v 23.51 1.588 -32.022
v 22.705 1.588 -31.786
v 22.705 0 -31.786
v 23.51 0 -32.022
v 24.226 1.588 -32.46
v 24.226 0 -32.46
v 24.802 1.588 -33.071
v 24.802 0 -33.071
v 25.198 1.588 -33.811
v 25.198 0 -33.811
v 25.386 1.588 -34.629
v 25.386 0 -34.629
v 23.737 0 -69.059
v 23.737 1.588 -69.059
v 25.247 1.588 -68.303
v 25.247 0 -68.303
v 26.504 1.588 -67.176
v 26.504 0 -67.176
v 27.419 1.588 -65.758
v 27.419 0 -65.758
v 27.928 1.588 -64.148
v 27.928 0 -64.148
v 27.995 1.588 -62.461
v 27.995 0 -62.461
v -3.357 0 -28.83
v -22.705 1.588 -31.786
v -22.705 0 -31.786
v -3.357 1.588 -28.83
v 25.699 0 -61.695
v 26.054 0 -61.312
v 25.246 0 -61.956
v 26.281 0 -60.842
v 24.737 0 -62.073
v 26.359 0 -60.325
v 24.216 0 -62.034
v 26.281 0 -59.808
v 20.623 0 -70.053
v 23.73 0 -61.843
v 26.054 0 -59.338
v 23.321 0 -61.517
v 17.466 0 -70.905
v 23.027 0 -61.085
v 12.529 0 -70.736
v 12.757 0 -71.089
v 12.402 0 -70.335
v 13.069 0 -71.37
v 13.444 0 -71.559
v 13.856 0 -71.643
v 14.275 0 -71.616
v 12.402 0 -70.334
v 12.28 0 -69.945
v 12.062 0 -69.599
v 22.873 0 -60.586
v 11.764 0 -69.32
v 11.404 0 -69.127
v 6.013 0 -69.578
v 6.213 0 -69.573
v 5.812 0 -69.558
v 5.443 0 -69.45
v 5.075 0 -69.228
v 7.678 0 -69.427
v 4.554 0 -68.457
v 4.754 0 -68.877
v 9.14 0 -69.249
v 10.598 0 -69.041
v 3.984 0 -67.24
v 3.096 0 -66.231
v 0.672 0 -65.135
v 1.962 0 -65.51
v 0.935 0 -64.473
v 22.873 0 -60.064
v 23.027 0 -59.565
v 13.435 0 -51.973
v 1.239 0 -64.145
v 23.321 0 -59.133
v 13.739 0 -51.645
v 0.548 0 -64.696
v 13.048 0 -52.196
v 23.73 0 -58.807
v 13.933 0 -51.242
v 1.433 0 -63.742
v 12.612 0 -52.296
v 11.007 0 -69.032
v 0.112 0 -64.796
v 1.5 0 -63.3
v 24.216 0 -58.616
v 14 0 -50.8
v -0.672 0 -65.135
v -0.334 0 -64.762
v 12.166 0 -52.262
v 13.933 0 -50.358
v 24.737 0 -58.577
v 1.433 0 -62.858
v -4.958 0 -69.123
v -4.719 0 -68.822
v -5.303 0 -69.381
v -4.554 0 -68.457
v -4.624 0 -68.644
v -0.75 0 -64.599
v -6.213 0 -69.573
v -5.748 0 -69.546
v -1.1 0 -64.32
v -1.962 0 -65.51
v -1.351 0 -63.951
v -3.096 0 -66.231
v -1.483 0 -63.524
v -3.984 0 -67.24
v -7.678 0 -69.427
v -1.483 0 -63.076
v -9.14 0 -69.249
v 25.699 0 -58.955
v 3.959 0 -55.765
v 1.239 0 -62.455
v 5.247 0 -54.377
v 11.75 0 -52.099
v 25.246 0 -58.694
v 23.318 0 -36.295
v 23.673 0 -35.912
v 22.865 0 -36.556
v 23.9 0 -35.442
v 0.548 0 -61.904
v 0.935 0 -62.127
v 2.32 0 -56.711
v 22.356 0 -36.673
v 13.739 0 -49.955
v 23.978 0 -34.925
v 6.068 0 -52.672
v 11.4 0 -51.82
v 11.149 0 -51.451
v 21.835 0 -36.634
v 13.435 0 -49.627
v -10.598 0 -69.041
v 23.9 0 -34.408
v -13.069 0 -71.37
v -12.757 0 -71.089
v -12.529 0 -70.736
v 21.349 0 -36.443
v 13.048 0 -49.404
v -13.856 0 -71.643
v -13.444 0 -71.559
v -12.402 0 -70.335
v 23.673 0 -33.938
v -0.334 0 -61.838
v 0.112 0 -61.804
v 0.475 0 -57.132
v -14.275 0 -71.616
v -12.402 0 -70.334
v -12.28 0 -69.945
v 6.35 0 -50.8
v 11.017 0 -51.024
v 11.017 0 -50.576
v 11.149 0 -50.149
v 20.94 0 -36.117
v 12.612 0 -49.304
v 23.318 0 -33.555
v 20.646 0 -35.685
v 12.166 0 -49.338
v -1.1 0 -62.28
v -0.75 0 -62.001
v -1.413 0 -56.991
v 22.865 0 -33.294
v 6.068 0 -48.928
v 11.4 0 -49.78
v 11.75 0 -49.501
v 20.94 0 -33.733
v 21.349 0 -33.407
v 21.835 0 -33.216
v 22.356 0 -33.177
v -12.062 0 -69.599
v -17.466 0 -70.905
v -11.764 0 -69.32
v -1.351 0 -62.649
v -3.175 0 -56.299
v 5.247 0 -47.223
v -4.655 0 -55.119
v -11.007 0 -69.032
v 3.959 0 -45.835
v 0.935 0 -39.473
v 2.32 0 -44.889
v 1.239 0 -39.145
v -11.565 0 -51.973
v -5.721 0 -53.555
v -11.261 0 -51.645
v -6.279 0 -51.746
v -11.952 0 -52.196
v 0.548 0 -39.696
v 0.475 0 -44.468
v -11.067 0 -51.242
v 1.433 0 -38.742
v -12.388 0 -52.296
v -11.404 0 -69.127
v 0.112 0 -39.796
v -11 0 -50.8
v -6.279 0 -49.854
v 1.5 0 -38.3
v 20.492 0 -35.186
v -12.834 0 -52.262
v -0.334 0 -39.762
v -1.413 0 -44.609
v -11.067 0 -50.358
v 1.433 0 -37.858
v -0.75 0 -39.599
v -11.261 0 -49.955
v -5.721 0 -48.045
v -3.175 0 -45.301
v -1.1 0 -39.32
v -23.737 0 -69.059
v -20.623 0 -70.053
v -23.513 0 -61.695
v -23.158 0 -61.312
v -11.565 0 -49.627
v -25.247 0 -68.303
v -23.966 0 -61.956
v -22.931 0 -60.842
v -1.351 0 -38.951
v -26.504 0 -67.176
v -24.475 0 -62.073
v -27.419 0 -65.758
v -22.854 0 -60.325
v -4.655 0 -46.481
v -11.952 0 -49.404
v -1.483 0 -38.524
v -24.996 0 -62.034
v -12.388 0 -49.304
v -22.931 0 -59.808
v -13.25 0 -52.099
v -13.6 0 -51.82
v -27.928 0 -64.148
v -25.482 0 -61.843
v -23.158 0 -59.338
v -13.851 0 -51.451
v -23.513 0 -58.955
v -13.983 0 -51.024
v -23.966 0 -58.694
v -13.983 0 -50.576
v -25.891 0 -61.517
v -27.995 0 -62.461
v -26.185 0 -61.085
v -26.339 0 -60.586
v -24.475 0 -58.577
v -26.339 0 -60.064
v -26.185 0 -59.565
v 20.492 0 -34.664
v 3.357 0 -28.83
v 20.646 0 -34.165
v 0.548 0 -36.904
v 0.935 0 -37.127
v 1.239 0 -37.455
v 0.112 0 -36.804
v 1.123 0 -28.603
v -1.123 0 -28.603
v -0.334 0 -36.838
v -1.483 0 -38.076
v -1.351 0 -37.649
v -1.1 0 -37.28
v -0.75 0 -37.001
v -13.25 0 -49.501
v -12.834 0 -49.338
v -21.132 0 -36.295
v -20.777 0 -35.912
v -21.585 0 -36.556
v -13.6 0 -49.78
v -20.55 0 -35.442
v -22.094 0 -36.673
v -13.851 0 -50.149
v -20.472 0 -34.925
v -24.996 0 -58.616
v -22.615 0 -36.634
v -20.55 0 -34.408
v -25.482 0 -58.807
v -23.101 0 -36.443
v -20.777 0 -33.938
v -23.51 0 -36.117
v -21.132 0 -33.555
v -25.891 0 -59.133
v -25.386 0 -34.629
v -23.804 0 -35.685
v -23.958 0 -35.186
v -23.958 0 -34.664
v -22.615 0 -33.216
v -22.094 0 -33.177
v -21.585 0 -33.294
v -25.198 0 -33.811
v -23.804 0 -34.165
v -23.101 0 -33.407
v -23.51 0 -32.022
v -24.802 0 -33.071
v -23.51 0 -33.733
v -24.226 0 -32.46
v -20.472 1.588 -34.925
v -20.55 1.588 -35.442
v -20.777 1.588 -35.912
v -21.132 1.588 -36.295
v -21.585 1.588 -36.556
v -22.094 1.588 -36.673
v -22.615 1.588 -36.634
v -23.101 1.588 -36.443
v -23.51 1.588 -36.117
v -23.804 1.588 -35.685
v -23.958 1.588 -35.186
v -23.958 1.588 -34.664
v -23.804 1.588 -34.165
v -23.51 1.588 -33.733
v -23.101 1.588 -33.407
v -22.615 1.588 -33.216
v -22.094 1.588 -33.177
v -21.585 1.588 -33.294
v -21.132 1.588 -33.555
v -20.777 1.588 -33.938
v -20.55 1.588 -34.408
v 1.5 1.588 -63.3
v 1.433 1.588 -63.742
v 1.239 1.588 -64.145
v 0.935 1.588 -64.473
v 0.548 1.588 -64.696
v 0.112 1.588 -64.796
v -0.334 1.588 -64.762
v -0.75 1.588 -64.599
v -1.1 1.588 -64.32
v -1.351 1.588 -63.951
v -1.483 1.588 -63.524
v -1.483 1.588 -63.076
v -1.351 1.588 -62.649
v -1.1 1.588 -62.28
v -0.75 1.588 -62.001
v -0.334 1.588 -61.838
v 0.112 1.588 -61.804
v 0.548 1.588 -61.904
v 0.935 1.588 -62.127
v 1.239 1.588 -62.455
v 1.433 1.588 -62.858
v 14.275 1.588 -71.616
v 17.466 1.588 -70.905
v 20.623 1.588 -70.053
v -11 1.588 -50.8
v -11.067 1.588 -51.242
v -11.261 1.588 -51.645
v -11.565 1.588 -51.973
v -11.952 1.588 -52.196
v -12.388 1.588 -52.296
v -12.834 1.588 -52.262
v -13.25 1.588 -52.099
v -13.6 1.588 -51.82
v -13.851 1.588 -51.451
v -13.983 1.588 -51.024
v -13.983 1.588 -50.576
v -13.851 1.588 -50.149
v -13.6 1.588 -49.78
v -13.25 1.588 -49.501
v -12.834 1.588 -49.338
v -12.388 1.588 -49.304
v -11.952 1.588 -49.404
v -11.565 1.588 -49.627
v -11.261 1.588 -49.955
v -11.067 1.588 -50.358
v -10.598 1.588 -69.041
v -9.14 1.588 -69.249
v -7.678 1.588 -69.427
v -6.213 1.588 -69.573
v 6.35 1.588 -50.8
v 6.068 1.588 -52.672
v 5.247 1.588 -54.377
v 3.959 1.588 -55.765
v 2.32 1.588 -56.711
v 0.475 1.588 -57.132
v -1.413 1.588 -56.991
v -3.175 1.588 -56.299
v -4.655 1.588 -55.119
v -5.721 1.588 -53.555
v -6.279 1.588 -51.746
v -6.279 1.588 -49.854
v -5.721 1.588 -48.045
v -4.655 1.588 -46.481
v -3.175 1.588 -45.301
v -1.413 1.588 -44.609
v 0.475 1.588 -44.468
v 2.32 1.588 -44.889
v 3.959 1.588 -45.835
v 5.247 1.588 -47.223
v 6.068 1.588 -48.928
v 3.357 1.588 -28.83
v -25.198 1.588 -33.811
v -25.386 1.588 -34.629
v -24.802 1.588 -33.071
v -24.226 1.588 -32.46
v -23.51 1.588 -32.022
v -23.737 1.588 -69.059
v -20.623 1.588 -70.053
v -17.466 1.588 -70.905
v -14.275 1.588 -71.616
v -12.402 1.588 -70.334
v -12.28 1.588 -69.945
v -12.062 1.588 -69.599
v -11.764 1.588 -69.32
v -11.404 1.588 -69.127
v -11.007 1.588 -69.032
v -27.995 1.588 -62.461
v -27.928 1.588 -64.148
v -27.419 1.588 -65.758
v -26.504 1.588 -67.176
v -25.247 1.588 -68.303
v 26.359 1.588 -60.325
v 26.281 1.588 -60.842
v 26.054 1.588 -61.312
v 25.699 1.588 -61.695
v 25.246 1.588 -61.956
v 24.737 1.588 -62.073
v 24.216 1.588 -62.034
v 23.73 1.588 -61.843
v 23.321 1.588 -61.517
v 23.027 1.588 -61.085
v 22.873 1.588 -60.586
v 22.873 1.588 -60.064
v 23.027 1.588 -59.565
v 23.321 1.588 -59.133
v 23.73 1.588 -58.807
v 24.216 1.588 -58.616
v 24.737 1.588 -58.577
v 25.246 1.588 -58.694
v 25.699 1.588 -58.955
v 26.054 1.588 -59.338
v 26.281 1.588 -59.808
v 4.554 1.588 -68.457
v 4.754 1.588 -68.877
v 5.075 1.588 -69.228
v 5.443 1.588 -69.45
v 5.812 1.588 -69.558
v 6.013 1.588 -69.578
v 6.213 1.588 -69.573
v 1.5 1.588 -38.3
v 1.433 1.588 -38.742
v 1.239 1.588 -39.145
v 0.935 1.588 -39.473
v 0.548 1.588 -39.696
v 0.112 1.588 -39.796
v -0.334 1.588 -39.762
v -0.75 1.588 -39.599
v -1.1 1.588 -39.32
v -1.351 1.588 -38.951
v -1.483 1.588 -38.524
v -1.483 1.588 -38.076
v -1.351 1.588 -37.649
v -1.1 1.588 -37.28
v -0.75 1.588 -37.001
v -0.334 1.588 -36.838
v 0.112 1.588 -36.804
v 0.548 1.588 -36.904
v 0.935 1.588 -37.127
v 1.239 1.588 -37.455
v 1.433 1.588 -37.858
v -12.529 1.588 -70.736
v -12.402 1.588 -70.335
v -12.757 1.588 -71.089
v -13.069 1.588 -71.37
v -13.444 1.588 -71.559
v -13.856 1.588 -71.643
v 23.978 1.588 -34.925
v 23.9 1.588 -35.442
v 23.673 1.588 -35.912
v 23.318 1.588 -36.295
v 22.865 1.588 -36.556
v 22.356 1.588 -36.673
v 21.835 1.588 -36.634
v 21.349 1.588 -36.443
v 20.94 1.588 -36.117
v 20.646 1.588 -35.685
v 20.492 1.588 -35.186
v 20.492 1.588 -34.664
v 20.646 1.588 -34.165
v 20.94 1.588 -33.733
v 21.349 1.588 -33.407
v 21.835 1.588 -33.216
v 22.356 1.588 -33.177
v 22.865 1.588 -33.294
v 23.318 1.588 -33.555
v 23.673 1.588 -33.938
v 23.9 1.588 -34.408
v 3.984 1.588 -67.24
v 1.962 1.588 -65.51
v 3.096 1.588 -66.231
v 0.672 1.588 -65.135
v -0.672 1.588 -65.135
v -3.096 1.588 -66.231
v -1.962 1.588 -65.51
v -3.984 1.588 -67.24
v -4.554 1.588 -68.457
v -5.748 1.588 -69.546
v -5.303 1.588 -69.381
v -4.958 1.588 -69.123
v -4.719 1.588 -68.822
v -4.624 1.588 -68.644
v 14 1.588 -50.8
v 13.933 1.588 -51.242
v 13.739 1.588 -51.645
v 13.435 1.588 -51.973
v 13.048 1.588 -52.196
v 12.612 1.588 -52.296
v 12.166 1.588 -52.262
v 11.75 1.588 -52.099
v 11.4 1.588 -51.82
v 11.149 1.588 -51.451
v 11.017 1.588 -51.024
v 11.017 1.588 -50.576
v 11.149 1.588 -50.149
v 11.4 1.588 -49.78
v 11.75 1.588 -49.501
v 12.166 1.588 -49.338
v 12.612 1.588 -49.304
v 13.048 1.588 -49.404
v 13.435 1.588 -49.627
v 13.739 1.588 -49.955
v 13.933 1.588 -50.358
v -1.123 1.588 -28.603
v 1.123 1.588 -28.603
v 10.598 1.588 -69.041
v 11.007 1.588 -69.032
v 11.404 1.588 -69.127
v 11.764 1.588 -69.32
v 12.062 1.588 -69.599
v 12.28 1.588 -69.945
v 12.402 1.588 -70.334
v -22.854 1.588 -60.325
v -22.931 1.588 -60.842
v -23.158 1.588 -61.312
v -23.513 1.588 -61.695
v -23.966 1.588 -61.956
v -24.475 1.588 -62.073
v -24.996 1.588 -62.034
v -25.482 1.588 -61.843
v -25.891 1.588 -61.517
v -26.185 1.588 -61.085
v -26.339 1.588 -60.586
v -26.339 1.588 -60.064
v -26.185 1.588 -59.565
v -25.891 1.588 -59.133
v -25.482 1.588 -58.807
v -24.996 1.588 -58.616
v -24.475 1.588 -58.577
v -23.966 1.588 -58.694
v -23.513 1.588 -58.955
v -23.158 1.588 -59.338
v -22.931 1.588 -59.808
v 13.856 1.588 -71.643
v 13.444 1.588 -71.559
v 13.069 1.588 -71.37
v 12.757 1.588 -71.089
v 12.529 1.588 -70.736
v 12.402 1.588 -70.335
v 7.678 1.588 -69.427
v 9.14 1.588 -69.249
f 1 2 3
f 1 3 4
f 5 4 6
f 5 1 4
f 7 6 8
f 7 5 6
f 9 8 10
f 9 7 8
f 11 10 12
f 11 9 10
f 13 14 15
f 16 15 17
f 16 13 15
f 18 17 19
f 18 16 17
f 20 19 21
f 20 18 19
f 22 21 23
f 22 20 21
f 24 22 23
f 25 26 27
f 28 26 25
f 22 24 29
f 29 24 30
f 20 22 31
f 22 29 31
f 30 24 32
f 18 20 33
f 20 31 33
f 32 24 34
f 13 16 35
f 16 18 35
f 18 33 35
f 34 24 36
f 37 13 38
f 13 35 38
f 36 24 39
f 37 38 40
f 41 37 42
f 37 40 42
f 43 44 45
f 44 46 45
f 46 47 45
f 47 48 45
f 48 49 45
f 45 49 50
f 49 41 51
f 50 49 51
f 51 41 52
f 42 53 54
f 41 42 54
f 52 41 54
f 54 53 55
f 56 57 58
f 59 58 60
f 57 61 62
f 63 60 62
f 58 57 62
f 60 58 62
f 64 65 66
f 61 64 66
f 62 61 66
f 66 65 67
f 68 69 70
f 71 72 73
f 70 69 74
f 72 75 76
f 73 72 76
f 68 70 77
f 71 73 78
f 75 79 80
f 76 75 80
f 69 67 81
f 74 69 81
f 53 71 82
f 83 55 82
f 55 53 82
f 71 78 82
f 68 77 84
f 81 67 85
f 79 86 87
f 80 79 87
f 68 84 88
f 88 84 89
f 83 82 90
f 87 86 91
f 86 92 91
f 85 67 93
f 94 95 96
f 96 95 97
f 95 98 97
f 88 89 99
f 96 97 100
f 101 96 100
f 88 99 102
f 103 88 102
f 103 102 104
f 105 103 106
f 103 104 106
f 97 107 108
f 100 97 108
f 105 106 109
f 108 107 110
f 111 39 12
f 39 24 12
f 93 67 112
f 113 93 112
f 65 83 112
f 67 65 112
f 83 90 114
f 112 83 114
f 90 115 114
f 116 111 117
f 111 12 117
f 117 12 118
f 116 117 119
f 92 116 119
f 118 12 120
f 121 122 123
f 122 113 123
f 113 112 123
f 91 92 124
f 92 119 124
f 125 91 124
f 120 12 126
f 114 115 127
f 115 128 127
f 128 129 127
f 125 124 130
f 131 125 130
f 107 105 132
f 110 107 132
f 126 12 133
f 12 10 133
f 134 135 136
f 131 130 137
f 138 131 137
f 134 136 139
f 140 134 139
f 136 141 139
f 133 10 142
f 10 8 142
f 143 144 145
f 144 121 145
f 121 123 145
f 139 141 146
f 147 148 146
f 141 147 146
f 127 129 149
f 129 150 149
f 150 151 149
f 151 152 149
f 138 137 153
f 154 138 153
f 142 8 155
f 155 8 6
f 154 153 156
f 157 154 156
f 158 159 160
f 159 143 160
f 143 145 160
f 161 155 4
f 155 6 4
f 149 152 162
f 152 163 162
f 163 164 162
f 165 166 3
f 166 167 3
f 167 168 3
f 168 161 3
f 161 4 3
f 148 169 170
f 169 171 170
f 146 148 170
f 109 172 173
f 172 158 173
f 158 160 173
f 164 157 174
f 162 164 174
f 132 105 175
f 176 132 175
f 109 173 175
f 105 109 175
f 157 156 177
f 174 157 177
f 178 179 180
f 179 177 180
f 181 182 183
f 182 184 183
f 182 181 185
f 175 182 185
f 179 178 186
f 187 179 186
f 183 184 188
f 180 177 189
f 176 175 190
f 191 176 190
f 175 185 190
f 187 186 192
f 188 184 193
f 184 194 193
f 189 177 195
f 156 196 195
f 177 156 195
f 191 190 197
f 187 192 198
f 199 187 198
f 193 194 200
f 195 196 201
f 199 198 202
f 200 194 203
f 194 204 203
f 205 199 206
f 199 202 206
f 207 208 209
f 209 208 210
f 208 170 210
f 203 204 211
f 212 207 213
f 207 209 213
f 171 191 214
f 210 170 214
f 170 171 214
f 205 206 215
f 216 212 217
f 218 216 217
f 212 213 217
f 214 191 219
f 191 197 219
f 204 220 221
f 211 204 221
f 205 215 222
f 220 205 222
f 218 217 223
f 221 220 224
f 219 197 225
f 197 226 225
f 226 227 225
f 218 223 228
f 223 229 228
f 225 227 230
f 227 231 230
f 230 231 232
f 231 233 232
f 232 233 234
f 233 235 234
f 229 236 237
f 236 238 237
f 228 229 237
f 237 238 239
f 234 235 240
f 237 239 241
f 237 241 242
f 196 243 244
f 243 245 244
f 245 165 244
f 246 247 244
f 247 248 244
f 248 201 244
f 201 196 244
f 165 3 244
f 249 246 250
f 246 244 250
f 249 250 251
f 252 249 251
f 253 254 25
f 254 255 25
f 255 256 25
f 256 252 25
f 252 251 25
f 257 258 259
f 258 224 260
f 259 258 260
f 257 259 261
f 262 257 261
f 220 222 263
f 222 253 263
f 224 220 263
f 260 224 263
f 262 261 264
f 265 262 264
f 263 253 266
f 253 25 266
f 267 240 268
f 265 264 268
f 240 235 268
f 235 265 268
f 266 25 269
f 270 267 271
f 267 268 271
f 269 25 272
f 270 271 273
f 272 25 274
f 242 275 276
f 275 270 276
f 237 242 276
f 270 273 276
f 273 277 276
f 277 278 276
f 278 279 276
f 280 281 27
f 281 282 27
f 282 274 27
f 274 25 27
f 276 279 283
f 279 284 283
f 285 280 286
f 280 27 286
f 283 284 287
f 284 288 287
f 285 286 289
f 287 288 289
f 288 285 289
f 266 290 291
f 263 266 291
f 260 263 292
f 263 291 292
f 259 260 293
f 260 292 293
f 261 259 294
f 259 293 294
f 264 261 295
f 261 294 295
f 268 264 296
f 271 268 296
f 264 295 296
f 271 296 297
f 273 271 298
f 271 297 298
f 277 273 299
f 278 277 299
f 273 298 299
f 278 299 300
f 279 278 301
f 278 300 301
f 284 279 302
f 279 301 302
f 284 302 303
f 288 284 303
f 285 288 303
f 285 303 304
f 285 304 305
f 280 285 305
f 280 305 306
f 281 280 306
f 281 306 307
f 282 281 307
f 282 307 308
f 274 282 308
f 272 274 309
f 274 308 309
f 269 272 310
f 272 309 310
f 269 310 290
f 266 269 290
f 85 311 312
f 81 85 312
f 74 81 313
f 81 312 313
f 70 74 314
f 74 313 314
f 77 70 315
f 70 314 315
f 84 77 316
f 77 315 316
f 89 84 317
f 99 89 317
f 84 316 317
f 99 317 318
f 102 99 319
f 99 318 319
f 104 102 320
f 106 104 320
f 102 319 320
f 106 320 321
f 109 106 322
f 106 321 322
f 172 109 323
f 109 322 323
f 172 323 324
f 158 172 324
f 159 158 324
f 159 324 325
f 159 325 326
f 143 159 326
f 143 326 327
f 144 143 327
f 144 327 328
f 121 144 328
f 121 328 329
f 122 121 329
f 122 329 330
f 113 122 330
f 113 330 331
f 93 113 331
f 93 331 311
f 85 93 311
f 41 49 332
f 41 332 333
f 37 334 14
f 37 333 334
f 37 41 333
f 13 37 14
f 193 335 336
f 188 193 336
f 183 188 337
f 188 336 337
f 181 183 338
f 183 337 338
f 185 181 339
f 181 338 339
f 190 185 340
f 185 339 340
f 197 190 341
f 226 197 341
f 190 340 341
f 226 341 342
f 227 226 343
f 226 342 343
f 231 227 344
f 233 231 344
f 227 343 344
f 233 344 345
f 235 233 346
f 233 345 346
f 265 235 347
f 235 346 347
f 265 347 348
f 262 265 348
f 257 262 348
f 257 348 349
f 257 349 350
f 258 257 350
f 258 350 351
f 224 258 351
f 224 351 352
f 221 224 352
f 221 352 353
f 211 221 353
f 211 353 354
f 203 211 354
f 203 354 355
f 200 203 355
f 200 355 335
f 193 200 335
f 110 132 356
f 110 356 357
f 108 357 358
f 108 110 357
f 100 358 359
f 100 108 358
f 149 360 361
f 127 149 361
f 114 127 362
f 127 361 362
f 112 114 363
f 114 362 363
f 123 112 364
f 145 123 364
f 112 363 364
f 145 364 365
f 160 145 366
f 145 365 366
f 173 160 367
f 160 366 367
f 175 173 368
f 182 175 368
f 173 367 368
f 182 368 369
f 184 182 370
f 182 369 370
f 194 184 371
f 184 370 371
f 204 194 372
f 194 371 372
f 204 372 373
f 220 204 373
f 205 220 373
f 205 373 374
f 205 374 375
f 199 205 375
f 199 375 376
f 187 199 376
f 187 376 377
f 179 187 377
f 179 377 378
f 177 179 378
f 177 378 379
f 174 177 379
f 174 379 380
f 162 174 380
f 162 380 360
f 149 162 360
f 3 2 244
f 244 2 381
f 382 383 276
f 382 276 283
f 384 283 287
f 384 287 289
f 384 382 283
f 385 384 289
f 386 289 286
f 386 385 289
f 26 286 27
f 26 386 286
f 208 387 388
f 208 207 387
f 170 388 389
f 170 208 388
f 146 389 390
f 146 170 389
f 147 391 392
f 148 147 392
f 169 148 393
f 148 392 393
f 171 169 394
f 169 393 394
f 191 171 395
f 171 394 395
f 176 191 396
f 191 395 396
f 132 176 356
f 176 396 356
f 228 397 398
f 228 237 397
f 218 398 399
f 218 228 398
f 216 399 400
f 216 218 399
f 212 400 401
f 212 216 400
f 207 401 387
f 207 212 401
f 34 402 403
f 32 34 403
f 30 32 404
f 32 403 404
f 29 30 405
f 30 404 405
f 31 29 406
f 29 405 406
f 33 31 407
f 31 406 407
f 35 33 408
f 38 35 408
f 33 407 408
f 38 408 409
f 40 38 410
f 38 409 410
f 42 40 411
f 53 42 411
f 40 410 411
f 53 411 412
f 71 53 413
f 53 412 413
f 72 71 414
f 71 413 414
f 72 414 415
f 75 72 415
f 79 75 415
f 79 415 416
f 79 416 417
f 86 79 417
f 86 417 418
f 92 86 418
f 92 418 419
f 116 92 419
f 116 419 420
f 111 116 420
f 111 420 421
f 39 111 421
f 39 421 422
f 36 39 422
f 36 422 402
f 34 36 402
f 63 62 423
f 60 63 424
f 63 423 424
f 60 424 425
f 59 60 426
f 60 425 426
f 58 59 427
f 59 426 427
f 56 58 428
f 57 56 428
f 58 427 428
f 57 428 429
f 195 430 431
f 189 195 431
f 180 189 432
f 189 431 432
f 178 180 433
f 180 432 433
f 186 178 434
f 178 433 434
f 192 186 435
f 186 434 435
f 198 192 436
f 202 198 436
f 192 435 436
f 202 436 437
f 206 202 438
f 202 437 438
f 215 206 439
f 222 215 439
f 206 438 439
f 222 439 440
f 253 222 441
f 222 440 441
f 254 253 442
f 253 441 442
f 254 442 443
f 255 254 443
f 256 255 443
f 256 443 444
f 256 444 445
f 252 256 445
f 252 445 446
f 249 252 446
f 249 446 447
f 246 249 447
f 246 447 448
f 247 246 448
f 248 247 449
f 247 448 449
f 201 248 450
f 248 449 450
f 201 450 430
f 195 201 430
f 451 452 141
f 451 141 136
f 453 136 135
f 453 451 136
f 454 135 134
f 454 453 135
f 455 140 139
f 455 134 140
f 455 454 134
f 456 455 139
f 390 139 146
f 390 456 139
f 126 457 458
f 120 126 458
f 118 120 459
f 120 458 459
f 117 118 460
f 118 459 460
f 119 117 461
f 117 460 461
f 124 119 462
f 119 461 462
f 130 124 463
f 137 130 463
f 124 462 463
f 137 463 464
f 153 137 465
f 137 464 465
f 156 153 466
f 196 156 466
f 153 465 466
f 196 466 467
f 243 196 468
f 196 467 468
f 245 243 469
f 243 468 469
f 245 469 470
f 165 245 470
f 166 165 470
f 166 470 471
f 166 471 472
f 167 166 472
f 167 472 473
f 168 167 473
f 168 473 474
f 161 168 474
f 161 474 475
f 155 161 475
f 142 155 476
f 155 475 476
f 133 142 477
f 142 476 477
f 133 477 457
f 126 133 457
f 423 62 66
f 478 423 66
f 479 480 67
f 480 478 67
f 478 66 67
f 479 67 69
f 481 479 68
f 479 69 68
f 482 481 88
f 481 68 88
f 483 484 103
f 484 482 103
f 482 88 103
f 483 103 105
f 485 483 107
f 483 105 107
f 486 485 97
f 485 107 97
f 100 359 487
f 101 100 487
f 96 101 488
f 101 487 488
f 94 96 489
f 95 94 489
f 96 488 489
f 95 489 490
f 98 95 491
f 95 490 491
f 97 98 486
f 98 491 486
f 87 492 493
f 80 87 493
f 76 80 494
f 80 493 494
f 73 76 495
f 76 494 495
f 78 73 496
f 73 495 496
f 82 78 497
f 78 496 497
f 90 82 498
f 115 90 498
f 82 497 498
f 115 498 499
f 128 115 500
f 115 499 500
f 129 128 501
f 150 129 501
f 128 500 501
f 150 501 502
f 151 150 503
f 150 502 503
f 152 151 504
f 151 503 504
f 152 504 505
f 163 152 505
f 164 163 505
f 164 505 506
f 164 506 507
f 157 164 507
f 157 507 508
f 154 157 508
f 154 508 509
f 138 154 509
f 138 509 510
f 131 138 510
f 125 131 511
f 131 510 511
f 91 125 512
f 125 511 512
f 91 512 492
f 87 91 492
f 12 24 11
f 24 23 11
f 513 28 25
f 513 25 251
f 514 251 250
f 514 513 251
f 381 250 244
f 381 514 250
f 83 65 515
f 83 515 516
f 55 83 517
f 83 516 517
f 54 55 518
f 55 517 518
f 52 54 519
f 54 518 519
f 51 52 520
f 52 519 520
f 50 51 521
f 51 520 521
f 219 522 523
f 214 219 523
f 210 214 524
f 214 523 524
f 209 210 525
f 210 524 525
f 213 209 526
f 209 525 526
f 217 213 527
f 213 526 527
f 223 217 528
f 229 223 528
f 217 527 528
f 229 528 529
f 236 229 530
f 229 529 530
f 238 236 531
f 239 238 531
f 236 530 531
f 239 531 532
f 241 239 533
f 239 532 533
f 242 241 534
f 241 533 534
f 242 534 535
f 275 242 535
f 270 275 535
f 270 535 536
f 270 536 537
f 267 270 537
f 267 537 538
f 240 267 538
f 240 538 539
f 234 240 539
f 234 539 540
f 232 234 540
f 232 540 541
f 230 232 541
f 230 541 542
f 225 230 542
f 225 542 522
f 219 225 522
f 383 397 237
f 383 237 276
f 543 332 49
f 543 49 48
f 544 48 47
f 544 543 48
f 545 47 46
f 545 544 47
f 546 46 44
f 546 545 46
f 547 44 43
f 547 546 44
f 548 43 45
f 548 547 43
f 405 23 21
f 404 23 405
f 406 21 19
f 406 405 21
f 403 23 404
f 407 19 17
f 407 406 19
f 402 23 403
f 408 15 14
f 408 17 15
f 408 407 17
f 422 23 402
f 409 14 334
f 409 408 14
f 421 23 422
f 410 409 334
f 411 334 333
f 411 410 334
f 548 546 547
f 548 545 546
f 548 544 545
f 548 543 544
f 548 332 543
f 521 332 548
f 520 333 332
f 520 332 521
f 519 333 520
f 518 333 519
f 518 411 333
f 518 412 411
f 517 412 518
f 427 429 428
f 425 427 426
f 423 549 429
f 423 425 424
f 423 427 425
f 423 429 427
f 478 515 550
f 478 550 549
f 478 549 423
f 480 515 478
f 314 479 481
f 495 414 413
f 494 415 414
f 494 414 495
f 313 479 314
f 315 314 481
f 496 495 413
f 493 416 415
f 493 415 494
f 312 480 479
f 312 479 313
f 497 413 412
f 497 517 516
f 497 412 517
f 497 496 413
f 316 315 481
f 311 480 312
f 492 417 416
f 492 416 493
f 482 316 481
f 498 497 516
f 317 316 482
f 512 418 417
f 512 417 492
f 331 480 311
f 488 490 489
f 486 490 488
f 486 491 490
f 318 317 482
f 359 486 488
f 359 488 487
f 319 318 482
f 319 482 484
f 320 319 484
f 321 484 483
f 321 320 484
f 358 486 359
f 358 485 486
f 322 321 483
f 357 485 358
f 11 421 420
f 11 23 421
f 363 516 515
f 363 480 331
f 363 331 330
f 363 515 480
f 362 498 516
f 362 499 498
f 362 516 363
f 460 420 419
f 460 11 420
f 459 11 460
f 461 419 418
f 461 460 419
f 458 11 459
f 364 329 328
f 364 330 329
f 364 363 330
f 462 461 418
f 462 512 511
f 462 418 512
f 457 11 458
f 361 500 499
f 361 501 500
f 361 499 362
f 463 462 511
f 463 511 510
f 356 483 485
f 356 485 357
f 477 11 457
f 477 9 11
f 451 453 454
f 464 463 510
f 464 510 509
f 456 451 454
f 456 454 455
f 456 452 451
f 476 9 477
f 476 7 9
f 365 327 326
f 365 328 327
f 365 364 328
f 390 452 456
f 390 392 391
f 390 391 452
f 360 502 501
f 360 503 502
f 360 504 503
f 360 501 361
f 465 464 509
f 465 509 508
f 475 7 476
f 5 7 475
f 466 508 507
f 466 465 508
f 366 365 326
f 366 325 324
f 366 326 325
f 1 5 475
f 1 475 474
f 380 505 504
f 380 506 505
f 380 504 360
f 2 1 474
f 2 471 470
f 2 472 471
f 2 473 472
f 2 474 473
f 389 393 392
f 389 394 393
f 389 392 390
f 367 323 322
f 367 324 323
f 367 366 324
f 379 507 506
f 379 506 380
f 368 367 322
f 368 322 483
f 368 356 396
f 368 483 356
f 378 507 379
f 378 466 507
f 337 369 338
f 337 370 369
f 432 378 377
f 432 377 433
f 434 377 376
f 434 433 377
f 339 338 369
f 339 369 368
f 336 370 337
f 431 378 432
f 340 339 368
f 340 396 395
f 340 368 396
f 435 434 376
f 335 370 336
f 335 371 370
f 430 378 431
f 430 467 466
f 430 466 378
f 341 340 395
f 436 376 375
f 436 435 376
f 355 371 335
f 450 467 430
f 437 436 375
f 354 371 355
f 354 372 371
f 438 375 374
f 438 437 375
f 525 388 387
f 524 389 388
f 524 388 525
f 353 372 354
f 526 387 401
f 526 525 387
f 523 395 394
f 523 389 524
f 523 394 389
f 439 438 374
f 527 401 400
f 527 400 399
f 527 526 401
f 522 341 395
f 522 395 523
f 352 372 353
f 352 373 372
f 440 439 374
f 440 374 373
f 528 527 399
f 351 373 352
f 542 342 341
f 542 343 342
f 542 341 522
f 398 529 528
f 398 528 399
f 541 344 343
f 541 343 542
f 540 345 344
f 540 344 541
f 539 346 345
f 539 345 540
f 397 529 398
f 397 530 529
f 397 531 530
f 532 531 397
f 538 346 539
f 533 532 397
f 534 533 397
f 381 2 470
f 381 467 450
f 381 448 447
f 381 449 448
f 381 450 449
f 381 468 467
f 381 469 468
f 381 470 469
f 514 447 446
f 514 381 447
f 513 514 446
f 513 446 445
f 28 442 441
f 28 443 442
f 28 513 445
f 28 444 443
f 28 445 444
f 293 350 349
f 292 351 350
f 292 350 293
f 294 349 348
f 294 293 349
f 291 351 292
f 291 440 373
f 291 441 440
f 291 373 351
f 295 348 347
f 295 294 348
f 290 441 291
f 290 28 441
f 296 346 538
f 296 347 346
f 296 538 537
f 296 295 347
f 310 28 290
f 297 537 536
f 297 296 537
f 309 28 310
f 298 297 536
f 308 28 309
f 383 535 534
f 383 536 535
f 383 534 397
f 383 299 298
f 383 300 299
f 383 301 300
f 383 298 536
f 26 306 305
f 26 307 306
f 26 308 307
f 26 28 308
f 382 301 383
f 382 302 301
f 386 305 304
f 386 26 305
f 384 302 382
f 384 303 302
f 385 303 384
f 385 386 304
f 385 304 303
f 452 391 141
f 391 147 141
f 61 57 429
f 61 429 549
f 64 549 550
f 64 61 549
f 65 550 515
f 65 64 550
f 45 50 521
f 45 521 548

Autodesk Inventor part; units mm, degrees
ref_plane "YZ Plane" through (0, 0, 0) normal (1, 0, 0) x (0, 1, 0)
ref_plane "XZ Plane" through (0, 0, 0) normal (0, 1, 0) x (-1, 0, 0)
ref_plane "XY Plane" through (0, 0, 0) normal (0, 0, 1) x (1, 0, 0)
sketch "Sketch1" plane through (0, 0, 0) normal (0, 1, 0) x (-1, 0, 0)
  circle A0 centre (0, 0) radius 73.025
  line L0 (0, 0) -> (0, -73.025) construction
  line L1 (0, 0) -> (-12.6807, -71.9156)
  line L2 (0, 0) -> (12.6807, -71.9156)
  line L3 (0, 0) -> (72.3143, -10.1631)
  line L4 (0, 0) -> (64.4772, -34.2832)
  line L5 (0, 0) -> (32.0121, 65.6344)
  line L6 (0, 0) -> (52.5298, 50.7274)
  line L7 (0, 0) -> (-52.5298, 50.7274)
  line L8 (0, 0) -> (-32.0121, 65.6344)
  line L9 (0, 0) -> (-64.4772, -34.2832)
  line L10 (0, 0) -> (-72.3143, -10.1631)
  circle A1 centre (0, 0) radius 69.85
  arc A2 (4.7597, -69.6876) -> (-4.7597, -69.6876) centre (0, -69.85) ccw
  arc A3 (67.7477, -17.0079) -> (64.806, -26.0614) centre (66.4313, -21.5848) ccw
  arc A4 (37.1107, 59.1762) -> (44.8121, 53.5808) centre (41.0568, 56.5098) ccw
  arc A5 (-44.8121, 53.5808) -> (-37.1107, 59.1762) centre (-41.0568, 56.5098) ccw
  arc A6 (-64.806, -26.0614) -> (-67.7477, -17.0079) centre (-66.4313, -21.5848) ccw
  point P0 (61.6739, -32.7926)
  point P1 (69.1702, -9.7212)
  point P2 (50.2459, 48.5219)
  point P3 (30.6202, 62.7808)
  point P4 (-30.6202, 62.7808)
  point P5 (-50.2459, 48.5219)
  point P6 (-69.1702, -9.7212)
  point P7 (-61.6739, -32.7926)
  point P8 (-12.1293, -68.7888)
  point P9 (12.1293, -68.7888)
  point P10 (64.806, -26.0614)
  point P11 (67.7477, -17.0079)
  point P12 (44.8121, 53.5808)
  point P13 (37.1107, 59.1762)
  point P14 (-37.1107, 59.1762)
  point P15 (-67.7477, -17.0079)
  dimension "d0" = 146.05
  dimension "d1" = 10
  dimension "d4" = 360
  dimension "d6" = 3.175
  dimension "d10" = 9.525
  dimension "d13" = 360
extrude "Extrusion1" add sketch "Sketch1" along normal blind 1.5875 contours A0 L3 A1 L6 | L5 A1 L8 A0 | A1 L3 L6 | L6 L5 A1 A4 | A0 L2 A1 L4 | A1 A3 L4 L3 | L5 L8 A1 | L2 A1 A2 L1 | L4 A1 L2 | L10 A1 L7 | L7 A1 A5 L8 | L1 A1 L9 | L9 A1 A6 L10 | L7 A1 L10 A0 | L1 A0 L9 A1
fillet "Fillet1" radius 1.5875 30 edges at (30.6202, 0.7937, 62.7808) (32.0121, 0.7937, 65.6344) (-30.6202, 0.7937, 62.7808) (-32.0121, 0.7937, 65.6344) (-52.5298, 0.7937, 50.7274) (-50.2459, 0.7937, 48.5219) (52.5298, 0.7937, 50.7274) (50.2459, 0.7937, 48.5219) (64.4772, 0.7937, -34.2832) (61.6739, 0.7937, -32.7926) (72.3143, 0.7937, -10.1631) (69.1702, 0.7937, -9.7212) (12.6807, 0.7937, -71.9156) (12.1293, 0.7937, -68.7888) (-12.6807, 0.7937, -71.9156) (-12.1293, 0.7937, -68.7888) (-72.3143, 0.7937, -10.1631) (-69.1702, 0.7937, -9.7212) (-64.4772, 0.7937, -34.2832) (-61.6739, 0.7937, -32.7926) (37.1107, 0.7937, 59.1762) (44.8121, 0.7937, 53.5808) (-44.8121, 0.7937, 53.5808) (-37.1107, 0.7937, 59.1762) (-64.806, 0.7937, -26.0614) (-67.7477, 0.7937, -17.0079) (4.7597, 0.7937, -69.6876) (-4.7597, 0.7937, -69.6876) (67.7477, 0.7937, -17.0079) (64.806, 0.7937, -26.0614)
sketch "Sketch5" plane through (0, 1.5875, 0) normal (0, 1, 0) x (1, 0, 0)
  line L0 (0, 0) -> (0, 65.0875) construction
  arc A0 (-4.554, 68.4564) -> (4.554, 68.4564) centre (0, 69.85) ccw projected
  circle A1 centre (0, 50.8) radius 22.225
  arc A2 (63.6995, 35.7075) -> (14.2757, 71.616) centre (0, 0) ccw projected
  circle A3 centre (0, 50.8) radius 12.5 construction
  circle A4 centre (-24.6062, 60.325) radius 1.7526
  circle A5 centre (-24.6062, 60.325) radius 3.175 construction
  circle A6 centre (-22.225, 34.925) radius 3.175
  circle A7 centre (-22.225, 34.925) radius 1.7526
  circle A8 centre (24.6062, 60.325) radius 1.7526
  circle A9 centre (24.6062, 60.325) radius 3.175
  circle A10 centre (22.225, 34.925) radius 3.175
  circle A11 centre (22.225, 34.925) radius 1.7526
  arc A12 (6.2133, 69.5731) -> (4.554, 68.4564) centre (6.0721, 67.9919) ccw projected
  arc A13 (6.2133, 69.5731) -> (4.554, 68.4564) centre (6.0721, 67.9919) ccw
  arc A14 (-4.554, 68.4564) -> (-6.2133, 69.5731) centre (-6.0721, 67.9919) ccw projected
  arc A15 (-4.554, 68.4564) -> (-6.2133, 69.5731) centre (-6.0721, 67.9919) ccw
  arc A16 (-12.4019, 70.3348) -> (-10.5977, 69.0414) centre (-10.8385, 70.6105) ccw projected
  arc A17 (10.5977, 69.0414) -> (12.4019, 70.3348) centre (10.8385, 70.6105) ccw projected
  arc A18 (10.5977, 69.0414) -> (6.2133, 69.5731) centre (0, 0) ccw projected
  arc A19 (10.5977, 69.0414) -> (11.9875, 69.515) centre (10.8385, 70.6105) ccw
  arc A20 (-6.2133, 69.5731) -> (-10.5977, 69.0414) centre (0, 0) ccw
  arc A21 (-14.2757, 71.616) -> (-63.6995, 35.7075) centre (0, 0) ccw projected
  line L1 (-28.4451, 67.2572) -> (-25.3861, 34.6286)
  line L2 (-22.7046, 31.7864) -> (-3.3572, 28.83)
  line L3 (28.4451, 67.2572) -> (25.3861, 34.6286)
  line L4 (22.7046, 31.7864) -> (3.3572, 28.83)
  circle A22 centre (0, 63.3) radius 1.5
  circle A23 centre (-12.5, 50.8) radius 1.5
  circle A24 centre (0, 38.3) radius 1.5
  circle A25 centre (12.5, 50.8) radius 1.5
  circle A26 centre (0, 50.8) radius 6.35
  circle A27 centre (0, 0) radius 73.025
  point P0 (-63.6995, 35.7075)
  dimension "d39" = 25
  dimension "d40" = 44.45
  dimension "d41" = 3.5052
  dimension "d42" = 6.35
  dimension "d43" = 9.525
  dimension "d44" = 24.6062
  dimension "d45" = 6.35
  dimension "d46" = 3.5052
  dimension "d47" = 15.875
  dimension "d48" = 22.225
  dimension "d63" = 3
  dimension "d66" = 360
  dimension "d68" = 12.7
extrude "Extrusion3" cut sketch "Sketch5" against normal blind 25.4 contours A1 L4 A10 L3 A2 A27 A21 L1 A6 L2 | A4 | A7 | A8 | A11 | A22 | A23 | A24 | A25 | A26
fillet "Fillet4" radius 6.35 2 edges at (-28.4451, 0.7937, -67.2572) (28.4451, 0.7937, -67.2572)
equation "\"d45\" = d42"
equation "\"d46\" = d41"
properties part number "Top Plate" material "Aluminum 6061"
